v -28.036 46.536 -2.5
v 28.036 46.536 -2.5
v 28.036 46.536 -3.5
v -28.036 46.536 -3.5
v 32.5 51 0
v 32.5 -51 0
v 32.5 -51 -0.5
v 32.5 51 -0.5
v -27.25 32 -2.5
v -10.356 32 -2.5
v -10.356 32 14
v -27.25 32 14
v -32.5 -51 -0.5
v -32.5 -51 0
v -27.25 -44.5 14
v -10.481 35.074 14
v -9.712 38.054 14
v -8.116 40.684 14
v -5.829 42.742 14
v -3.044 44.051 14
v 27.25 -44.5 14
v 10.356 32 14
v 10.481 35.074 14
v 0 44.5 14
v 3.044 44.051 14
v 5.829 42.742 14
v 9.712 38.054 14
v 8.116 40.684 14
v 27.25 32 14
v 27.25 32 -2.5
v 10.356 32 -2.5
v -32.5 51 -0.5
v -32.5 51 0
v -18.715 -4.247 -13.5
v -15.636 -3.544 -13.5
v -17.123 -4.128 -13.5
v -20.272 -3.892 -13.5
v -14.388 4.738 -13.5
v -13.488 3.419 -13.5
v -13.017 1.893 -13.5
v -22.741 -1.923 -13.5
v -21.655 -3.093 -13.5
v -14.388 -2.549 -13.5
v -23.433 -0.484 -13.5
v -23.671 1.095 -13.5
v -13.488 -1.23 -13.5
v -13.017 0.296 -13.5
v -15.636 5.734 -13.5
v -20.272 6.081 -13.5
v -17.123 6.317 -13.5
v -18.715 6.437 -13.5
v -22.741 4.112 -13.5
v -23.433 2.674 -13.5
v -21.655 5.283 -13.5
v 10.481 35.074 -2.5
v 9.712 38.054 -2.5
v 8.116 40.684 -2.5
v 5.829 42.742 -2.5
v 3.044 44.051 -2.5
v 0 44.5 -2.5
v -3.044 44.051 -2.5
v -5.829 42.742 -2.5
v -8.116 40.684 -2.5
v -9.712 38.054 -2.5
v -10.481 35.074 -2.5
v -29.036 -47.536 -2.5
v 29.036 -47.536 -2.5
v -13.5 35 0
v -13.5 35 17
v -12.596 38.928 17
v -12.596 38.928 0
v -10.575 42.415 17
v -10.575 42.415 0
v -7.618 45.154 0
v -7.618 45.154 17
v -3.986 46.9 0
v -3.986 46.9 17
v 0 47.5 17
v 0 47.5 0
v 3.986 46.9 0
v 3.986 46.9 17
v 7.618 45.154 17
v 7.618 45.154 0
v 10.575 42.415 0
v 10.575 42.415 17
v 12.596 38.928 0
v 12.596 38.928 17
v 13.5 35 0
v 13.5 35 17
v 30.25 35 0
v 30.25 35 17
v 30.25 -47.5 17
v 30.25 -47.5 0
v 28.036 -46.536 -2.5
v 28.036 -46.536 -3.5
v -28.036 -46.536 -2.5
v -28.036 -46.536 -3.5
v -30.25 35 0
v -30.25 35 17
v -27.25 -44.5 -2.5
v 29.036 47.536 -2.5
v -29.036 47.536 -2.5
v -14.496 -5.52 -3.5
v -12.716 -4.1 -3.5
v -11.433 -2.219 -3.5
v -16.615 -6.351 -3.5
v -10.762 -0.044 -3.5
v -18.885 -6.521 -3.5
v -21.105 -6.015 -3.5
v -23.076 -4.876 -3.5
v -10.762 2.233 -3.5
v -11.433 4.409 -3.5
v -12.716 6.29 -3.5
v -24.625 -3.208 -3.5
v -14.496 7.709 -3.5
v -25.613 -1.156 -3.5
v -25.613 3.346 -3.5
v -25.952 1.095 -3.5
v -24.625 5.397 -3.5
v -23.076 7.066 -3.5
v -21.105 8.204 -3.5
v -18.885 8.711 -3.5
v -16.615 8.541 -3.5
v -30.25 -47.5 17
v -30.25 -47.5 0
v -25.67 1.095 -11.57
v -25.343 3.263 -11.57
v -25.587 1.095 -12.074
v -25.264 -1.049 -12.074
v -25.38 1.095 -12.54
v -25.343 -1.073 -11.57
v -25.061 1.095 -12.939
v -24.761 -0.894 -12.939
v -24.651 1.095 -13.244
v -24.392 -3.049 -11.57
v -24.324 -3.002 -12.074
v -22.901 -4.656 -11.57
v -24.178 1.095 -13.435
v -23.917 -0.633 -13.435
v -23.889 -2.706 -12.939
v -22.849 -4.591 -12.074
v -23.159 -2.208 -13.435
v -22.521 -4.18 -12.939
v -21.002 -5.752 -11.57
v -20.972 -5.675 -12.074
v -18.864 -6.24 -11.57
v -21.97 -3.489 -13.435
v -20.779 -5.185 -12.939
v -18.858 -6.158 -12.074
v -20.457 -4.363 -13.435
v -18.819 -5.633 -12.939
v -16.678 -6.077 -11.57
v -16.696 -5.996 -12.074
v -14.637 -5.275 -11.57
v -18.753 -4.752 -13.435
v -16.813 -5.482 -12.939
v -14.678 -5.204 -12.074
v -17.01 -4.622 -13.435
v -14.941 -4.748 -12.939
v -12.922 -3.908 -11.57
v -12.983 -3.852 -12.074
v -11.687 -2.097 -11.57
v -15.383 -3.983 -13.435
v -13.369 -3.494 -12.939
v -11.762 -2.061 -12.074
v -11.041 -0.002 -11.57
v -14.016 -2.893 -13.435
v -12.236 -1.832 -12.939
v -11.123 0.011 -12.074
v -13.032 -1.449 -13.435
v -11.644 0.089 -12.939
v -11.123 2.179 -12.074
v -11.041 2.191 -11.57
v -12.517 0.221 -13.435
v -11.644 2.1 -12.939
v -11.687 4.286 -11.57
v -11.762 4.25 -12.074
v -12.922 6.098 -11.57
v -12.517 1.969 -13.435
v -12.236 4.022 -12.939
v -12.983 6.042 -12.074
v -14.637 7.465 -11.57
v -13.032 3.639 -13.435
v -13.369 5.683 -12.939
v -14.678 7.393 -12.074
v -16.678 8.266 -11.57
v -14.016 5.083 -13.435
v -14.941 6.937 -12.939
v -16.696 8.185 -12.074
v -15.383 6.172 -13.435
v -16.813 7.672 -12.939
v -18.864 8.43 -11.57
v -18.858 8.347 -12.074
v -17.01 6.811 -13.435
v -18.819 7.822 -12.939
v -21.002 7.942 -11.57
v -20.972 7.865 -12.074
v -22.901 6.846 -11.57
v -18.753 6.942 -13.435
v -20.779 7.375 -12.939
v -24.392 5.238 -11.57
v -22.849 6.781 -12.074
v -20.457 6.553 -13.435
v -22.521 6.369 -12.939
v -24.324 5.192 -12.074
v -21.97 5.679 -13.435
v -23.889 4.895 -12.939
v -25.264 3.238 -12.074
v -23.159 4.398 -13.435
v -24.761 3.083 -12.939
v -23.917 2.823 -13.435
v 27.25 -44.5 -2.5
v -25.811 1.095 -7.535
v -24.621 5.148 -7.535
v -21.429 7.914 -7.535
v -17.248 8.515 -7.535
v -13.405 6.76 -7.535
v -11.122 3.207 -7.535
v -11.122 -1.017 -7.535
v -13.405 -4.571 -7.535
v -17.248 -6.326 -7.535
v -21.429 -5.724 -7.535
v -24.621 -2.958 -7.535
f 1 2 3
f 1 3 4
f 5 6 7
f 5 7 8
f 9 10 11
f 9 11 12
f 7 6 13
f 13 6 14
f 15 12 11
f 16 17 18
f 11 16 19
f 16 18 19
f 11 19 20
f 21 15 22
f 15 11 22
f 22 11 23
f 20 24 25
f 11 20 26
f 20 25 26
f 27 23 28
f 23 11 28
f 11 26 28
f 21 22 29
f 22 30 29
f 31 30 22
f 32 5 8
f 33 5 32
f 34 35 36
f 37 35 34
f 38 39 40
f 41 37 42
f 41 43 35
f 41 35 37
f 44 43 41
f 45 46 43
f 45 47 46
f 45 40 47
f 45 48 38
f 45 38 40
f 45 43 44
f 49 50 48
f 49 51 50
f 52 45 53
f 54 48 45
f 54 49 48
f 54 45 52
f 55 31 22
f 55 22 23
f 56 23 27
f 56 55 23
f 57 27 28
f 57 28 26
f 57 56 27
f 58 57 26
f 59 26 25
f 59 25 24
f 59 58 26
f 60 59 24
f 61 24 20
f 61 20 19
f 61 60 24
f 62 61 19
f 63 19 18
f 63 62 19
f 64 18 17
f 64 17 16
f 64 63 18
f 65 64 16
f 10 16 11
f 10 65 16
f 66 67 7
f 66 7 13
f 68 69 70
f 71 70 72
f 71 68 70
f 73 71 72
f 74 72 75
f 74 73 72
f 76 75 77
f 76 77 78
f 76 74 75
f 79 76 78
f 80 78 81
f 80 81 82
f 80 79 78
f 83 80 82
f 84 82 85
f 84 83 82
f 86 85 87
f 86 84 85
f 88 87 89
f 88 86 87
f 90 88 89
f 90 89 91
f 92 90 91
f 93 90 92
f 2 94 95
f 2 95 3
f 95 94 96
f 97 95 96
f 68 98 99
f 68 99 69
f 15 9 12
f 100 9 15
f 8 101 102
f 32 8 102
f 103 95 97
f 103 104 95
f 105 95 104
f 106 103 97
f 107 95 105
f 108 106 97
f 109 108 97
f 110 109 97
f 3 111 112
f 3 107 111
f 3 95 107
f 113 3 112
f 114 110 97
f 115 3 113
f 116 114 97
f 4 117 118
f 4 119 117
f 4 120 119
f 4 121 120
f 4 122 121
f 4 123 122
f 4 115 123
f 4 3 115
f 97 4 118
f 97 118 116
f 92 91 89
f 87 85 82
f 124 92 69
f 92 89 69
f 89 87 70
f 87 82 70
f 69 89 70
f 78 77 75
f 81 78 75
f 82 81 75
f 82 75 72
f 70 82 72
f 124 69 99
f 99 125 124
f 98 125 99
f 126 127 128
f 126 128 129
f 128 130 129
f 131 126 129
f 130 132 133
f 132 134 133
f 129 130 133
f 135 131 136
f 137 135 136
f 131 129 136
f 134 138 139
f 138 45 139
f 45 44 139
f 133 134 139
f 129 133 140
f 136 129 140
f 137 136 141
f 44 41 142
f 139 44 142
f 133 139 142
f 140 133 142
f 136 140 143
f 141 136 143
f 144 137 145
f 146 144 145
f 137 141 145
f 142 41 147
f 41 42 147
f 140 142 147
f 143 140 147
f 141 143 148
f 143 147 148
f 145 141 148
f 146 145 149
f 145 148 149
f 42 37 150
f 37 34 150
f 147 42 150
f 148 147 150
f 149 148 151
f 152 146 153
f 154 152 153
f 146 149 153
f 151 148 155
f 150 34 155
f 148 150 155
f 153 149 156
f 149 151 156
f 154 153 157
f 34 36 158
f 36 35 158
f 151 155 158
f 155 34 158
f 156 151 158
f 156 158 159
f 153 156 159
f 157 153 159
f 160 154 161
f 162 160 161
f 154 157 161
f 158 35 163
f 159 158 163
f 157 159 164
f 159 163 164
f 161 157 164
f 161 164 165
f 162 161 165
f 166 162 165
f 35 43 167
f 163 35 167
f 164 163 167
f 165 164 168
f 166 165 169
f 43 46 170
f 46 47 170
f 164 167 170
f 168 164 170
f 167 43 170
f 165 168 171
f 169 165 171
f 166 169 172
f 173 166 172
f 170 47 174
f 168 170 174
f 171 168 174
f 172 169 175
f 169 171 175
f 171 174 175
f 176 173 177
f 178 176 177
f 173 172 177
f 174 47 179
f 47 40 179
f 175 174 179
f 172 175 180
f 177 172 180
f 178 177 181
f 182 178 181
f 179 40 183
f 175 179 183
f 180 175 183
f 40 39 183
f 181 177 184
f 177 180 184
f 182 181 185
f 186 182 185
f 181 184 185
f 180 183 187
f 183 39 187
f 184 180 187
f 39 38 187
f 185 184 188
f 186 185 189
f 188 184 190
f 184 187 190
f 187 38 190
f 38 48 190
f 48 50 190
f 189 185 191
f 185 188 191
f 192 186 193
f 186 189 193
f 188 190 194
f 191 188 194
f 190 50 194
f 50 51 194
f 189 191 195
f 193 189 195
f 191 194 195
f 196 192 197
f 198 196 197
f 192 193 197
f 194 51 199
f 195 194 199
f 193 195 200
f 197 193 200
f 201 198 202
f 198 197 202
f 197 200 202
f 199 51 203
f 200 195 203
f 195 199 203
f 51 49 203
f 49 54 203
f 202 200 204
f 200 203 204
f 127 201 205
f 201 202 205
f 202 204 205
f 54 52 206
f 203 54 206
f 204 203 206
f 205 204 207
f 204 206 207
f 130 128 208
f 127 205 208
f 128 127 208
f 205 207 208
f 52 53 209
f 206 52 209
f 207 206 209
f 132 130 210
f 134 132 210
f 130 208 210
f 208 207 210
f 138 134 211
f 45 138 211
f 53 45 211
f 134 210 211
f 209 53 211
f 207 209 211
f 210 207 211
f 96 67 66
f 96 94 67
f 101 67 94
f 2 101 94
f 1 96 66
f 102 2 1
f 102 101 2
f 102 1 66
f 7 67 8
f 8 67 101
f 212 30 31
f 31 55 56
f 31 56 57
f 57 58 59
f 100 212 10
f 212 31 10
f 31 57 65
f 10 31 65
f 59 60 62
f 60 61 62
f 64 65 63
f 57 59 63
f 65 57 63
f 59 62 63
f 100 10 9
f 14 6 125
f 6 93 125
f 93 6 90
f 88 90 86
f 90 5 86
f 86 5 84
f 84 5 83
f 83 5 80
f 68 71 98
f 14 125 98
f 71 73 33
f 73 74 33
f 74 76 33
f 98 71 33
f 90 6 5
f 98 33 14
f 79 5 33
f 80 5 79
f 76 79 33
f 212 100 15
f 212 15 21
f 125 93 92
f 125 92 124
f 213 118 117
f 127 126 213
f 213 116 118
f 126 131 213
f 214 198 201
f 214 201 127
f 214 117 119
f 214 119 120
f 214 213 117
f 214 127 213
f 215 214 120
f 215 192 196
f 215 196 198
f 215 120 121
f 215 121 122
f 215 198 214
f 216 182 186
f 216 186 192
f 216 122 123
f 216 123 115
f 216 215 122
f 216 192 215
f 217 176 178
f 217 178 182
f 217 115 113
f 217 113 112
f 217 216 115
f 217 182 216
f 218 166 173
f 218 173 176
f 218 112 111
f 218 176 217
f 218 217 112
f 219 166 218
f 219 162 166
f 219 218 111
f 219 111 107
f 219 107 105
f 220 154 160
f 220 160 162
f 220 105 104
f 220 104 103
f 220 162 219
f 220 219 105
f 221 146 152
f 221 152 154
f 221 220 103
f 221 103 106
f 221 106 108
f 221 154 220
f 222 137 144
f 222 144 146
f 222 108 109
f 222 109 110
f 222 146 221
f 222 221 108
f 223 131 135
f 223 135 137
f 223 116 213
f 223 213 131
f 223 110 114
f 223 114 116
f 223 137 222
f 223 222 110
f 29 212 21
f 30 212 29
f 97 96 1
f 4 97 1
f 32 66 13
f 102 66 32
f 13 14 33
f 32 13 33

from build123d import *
from OCP.BRepFilletAPI import BRepFilletAPI_MakeChamfer

# Parameters (mm, degrees)
BOSS_EXTRUDE1_DEPTH = 17
SKETCH2_W           = 65
SKETCH2_H           = 102
BOSS_EXTRUDE2_DEPTH = 2.5
SHELL1_START        = -2.5
SHELL1_DEPTH        = 16.5
CHAMFER1_SIZE       = 2
CHAMFER1_SIZE2      = 3.464101615
SKETCH3_W           = 56.07179677
SKETCH3_H           = 93.07179677
BOSS_EXTRUDE3_DEPTH = 1
SKETCH5_R           = 7.637477526
BOSS_EXTRUDE4_DEPTH = 10
BOSS_EXTRUDE4_TAPER = 2
FILLET1_R           = 2


# Read off the part's stored shape, not the designer's step: Shell1
with BuildPart() as part:
    # Sketch1 → Boss-Extrude1 (new body)
    with BuildSketch(Plane.XY):
        with BuildLine():
            Line((13.5, 35), (30.25, 35))
            Line((30.25, 35), (30.25, -47.5))
            Line((30.25, -47.5), (-30.25, -47.5))
            Line((-30.25, -47.5), (-30.25, 35))
            Line((-30.25, 35), (-13.5, 35))
            ThreePointArc((-13.5, 35), (0, 47.5), (13.5, 35))
        make_face()
    extrude(amount=BOSS_EXTRUDE1_DEPTH)

    # Sketch2 → Boss-Extrude2 (add)
    with BuildSketch(Plane(origin=(0, 0, 0), x_dir=(-1, 0, 0), z_dir=(0, 0, -1))):
        Rectangle(SKETCH2_W, SKETCH2_H)
    extrude(amount=BOSS_EXTRUDE2_DEPTH)

    # Shell1 outline → Shell1 (cut)
    with BuildSketch(Plane.XY.offset(SHELL1_START)):
        with BuildLine():
            Line((27.25, -44.5), (27.25, 32))
            Line((27.25, 32), (10.356157589, 32))
            ThreePointArc((10.356157589, 32), (0, 44.5), (-10.356157589, 32))
            Line((-10.356157589, 32), (-27.25, 32))
            Line((-27.25, 32), (-27.25, -44.5))
            Line((-27.25, -44.5), (27.25, -44.5))
        make_face()
    extrude(amount=SHELL1_DEPTH, mode=Mode.SUBTRACT)

    # Chamfer1: one chamfer whose edges measure the first distance from different faces: ONE call of the kernel's chamfer builder (chamfer() names one face for all edges)
    chamfer1_edges_1 = [part.edges().sort_by_distance(p)[0] for p in [
        (0, -51, -2.5),
    ]]
    chamfer1_side_1 = [part.faces().sort_by_distance(p)[0] for p in [
        (0, -51, -1.25),
    ]]
    chamfer1_edges_2 = [part.edges().sort_by_distance(p)[0] for p in [
        (32.5, 0, -2.5),
    ]]
    chamfer1_side_2 = [part.faces().sort_by_distance(p)[0] for p in [
        (32.5, 0, -1.25),
    ]]
    chamfer1_edges_3 = [part.edges().sort_by_distance(p)[0] for p in [
        (0, 51, -2.5),
    ]]
    chamfer1_side_3 = [part.faces().sort_by_distance(p)[0] for p in [
        (0, 51, -1.25),
    ]]
    chamfer1_edges_4 = [part.edges().sort_by_distance(p)[0] for p in [
        (-32.5, 0, -2.5),
    ]]
    chamfer1_side_4 = [part.faces().sort_by_distance(p)[0] for p in [
        (-32.5, 0, -1.25),
    ]]
    chamfer1 = BRepFilletAPI_MakeChamfer(part.part.solid().wrapped)
    for e in chamfer1_edges_1:
        chamfer1.Add(CHAMFER1_SIZE, CHAMFER1_SIZE2, e.wrapped, chamfer1_side_1[0].wrapped)  # the first distance lies on this face
    for e in chamfer1_edges_2:
        chamfer1.Add(CHAMFER1_SIZE, CHAMFER1_SIZE2, e.wrapped, chamfer1_side_2[0].wrapped)  # the first distance lies on this face
    for e in chamfer1_edges_3:
        chamfer1.Add(CHAMFER1_SIZE, CHAMFER1_SIZE2, e.wrapped, chamfer1_side_3[0].wrapped)  # the first distance lies on this face
    for e in chamfer1_edges_4:
        chamfer1.Add(CHAMFER1_SIZE, CHAMFER1_SIZE2, e.wrapped, chamfer1_side_4[0].wrapped)  # the first distance lies on this face
    add(Compound.cast(chamfer1.Shape()), mode=Mode.REPLACE)

    # Sketch3 → Boss-Extrude3 (add)
    with BuildSketch(Plane(origin=(0, 0, -2.5), x_dir=(-1, 0, 0), z_dir=(0, 0, -1))):
        Rectangle(SKETCH3_W, SKETCH3_H)
    extrude(amount=BOSS_EXTRUDE3_DEPTH)

    # Sketch5 → Boss-Extrude4 (add)
    with BuildSketch(Plane(origin=(0, 0, -3.5), x_dir=(-1, 0, 0), z_dir=(0, 0, -1))):
        with Locations((18.314549778, 1.094735509)):
            Circle(SKETCH5_R)
    extrude(amount=BOSS_EXTRUDE4_DEPTH, taper=BOSS_EXTRUDE4_TAPER)

    # Fillet1
    fillet1_edges = [part.edges().sort_by_distance(p)[0] for p in [
        (-11.026279948, 1.094735509, -13.5),
    ]]
    fillet(fillet1_edges, radius=FILLET1_R)


solid = part.part
